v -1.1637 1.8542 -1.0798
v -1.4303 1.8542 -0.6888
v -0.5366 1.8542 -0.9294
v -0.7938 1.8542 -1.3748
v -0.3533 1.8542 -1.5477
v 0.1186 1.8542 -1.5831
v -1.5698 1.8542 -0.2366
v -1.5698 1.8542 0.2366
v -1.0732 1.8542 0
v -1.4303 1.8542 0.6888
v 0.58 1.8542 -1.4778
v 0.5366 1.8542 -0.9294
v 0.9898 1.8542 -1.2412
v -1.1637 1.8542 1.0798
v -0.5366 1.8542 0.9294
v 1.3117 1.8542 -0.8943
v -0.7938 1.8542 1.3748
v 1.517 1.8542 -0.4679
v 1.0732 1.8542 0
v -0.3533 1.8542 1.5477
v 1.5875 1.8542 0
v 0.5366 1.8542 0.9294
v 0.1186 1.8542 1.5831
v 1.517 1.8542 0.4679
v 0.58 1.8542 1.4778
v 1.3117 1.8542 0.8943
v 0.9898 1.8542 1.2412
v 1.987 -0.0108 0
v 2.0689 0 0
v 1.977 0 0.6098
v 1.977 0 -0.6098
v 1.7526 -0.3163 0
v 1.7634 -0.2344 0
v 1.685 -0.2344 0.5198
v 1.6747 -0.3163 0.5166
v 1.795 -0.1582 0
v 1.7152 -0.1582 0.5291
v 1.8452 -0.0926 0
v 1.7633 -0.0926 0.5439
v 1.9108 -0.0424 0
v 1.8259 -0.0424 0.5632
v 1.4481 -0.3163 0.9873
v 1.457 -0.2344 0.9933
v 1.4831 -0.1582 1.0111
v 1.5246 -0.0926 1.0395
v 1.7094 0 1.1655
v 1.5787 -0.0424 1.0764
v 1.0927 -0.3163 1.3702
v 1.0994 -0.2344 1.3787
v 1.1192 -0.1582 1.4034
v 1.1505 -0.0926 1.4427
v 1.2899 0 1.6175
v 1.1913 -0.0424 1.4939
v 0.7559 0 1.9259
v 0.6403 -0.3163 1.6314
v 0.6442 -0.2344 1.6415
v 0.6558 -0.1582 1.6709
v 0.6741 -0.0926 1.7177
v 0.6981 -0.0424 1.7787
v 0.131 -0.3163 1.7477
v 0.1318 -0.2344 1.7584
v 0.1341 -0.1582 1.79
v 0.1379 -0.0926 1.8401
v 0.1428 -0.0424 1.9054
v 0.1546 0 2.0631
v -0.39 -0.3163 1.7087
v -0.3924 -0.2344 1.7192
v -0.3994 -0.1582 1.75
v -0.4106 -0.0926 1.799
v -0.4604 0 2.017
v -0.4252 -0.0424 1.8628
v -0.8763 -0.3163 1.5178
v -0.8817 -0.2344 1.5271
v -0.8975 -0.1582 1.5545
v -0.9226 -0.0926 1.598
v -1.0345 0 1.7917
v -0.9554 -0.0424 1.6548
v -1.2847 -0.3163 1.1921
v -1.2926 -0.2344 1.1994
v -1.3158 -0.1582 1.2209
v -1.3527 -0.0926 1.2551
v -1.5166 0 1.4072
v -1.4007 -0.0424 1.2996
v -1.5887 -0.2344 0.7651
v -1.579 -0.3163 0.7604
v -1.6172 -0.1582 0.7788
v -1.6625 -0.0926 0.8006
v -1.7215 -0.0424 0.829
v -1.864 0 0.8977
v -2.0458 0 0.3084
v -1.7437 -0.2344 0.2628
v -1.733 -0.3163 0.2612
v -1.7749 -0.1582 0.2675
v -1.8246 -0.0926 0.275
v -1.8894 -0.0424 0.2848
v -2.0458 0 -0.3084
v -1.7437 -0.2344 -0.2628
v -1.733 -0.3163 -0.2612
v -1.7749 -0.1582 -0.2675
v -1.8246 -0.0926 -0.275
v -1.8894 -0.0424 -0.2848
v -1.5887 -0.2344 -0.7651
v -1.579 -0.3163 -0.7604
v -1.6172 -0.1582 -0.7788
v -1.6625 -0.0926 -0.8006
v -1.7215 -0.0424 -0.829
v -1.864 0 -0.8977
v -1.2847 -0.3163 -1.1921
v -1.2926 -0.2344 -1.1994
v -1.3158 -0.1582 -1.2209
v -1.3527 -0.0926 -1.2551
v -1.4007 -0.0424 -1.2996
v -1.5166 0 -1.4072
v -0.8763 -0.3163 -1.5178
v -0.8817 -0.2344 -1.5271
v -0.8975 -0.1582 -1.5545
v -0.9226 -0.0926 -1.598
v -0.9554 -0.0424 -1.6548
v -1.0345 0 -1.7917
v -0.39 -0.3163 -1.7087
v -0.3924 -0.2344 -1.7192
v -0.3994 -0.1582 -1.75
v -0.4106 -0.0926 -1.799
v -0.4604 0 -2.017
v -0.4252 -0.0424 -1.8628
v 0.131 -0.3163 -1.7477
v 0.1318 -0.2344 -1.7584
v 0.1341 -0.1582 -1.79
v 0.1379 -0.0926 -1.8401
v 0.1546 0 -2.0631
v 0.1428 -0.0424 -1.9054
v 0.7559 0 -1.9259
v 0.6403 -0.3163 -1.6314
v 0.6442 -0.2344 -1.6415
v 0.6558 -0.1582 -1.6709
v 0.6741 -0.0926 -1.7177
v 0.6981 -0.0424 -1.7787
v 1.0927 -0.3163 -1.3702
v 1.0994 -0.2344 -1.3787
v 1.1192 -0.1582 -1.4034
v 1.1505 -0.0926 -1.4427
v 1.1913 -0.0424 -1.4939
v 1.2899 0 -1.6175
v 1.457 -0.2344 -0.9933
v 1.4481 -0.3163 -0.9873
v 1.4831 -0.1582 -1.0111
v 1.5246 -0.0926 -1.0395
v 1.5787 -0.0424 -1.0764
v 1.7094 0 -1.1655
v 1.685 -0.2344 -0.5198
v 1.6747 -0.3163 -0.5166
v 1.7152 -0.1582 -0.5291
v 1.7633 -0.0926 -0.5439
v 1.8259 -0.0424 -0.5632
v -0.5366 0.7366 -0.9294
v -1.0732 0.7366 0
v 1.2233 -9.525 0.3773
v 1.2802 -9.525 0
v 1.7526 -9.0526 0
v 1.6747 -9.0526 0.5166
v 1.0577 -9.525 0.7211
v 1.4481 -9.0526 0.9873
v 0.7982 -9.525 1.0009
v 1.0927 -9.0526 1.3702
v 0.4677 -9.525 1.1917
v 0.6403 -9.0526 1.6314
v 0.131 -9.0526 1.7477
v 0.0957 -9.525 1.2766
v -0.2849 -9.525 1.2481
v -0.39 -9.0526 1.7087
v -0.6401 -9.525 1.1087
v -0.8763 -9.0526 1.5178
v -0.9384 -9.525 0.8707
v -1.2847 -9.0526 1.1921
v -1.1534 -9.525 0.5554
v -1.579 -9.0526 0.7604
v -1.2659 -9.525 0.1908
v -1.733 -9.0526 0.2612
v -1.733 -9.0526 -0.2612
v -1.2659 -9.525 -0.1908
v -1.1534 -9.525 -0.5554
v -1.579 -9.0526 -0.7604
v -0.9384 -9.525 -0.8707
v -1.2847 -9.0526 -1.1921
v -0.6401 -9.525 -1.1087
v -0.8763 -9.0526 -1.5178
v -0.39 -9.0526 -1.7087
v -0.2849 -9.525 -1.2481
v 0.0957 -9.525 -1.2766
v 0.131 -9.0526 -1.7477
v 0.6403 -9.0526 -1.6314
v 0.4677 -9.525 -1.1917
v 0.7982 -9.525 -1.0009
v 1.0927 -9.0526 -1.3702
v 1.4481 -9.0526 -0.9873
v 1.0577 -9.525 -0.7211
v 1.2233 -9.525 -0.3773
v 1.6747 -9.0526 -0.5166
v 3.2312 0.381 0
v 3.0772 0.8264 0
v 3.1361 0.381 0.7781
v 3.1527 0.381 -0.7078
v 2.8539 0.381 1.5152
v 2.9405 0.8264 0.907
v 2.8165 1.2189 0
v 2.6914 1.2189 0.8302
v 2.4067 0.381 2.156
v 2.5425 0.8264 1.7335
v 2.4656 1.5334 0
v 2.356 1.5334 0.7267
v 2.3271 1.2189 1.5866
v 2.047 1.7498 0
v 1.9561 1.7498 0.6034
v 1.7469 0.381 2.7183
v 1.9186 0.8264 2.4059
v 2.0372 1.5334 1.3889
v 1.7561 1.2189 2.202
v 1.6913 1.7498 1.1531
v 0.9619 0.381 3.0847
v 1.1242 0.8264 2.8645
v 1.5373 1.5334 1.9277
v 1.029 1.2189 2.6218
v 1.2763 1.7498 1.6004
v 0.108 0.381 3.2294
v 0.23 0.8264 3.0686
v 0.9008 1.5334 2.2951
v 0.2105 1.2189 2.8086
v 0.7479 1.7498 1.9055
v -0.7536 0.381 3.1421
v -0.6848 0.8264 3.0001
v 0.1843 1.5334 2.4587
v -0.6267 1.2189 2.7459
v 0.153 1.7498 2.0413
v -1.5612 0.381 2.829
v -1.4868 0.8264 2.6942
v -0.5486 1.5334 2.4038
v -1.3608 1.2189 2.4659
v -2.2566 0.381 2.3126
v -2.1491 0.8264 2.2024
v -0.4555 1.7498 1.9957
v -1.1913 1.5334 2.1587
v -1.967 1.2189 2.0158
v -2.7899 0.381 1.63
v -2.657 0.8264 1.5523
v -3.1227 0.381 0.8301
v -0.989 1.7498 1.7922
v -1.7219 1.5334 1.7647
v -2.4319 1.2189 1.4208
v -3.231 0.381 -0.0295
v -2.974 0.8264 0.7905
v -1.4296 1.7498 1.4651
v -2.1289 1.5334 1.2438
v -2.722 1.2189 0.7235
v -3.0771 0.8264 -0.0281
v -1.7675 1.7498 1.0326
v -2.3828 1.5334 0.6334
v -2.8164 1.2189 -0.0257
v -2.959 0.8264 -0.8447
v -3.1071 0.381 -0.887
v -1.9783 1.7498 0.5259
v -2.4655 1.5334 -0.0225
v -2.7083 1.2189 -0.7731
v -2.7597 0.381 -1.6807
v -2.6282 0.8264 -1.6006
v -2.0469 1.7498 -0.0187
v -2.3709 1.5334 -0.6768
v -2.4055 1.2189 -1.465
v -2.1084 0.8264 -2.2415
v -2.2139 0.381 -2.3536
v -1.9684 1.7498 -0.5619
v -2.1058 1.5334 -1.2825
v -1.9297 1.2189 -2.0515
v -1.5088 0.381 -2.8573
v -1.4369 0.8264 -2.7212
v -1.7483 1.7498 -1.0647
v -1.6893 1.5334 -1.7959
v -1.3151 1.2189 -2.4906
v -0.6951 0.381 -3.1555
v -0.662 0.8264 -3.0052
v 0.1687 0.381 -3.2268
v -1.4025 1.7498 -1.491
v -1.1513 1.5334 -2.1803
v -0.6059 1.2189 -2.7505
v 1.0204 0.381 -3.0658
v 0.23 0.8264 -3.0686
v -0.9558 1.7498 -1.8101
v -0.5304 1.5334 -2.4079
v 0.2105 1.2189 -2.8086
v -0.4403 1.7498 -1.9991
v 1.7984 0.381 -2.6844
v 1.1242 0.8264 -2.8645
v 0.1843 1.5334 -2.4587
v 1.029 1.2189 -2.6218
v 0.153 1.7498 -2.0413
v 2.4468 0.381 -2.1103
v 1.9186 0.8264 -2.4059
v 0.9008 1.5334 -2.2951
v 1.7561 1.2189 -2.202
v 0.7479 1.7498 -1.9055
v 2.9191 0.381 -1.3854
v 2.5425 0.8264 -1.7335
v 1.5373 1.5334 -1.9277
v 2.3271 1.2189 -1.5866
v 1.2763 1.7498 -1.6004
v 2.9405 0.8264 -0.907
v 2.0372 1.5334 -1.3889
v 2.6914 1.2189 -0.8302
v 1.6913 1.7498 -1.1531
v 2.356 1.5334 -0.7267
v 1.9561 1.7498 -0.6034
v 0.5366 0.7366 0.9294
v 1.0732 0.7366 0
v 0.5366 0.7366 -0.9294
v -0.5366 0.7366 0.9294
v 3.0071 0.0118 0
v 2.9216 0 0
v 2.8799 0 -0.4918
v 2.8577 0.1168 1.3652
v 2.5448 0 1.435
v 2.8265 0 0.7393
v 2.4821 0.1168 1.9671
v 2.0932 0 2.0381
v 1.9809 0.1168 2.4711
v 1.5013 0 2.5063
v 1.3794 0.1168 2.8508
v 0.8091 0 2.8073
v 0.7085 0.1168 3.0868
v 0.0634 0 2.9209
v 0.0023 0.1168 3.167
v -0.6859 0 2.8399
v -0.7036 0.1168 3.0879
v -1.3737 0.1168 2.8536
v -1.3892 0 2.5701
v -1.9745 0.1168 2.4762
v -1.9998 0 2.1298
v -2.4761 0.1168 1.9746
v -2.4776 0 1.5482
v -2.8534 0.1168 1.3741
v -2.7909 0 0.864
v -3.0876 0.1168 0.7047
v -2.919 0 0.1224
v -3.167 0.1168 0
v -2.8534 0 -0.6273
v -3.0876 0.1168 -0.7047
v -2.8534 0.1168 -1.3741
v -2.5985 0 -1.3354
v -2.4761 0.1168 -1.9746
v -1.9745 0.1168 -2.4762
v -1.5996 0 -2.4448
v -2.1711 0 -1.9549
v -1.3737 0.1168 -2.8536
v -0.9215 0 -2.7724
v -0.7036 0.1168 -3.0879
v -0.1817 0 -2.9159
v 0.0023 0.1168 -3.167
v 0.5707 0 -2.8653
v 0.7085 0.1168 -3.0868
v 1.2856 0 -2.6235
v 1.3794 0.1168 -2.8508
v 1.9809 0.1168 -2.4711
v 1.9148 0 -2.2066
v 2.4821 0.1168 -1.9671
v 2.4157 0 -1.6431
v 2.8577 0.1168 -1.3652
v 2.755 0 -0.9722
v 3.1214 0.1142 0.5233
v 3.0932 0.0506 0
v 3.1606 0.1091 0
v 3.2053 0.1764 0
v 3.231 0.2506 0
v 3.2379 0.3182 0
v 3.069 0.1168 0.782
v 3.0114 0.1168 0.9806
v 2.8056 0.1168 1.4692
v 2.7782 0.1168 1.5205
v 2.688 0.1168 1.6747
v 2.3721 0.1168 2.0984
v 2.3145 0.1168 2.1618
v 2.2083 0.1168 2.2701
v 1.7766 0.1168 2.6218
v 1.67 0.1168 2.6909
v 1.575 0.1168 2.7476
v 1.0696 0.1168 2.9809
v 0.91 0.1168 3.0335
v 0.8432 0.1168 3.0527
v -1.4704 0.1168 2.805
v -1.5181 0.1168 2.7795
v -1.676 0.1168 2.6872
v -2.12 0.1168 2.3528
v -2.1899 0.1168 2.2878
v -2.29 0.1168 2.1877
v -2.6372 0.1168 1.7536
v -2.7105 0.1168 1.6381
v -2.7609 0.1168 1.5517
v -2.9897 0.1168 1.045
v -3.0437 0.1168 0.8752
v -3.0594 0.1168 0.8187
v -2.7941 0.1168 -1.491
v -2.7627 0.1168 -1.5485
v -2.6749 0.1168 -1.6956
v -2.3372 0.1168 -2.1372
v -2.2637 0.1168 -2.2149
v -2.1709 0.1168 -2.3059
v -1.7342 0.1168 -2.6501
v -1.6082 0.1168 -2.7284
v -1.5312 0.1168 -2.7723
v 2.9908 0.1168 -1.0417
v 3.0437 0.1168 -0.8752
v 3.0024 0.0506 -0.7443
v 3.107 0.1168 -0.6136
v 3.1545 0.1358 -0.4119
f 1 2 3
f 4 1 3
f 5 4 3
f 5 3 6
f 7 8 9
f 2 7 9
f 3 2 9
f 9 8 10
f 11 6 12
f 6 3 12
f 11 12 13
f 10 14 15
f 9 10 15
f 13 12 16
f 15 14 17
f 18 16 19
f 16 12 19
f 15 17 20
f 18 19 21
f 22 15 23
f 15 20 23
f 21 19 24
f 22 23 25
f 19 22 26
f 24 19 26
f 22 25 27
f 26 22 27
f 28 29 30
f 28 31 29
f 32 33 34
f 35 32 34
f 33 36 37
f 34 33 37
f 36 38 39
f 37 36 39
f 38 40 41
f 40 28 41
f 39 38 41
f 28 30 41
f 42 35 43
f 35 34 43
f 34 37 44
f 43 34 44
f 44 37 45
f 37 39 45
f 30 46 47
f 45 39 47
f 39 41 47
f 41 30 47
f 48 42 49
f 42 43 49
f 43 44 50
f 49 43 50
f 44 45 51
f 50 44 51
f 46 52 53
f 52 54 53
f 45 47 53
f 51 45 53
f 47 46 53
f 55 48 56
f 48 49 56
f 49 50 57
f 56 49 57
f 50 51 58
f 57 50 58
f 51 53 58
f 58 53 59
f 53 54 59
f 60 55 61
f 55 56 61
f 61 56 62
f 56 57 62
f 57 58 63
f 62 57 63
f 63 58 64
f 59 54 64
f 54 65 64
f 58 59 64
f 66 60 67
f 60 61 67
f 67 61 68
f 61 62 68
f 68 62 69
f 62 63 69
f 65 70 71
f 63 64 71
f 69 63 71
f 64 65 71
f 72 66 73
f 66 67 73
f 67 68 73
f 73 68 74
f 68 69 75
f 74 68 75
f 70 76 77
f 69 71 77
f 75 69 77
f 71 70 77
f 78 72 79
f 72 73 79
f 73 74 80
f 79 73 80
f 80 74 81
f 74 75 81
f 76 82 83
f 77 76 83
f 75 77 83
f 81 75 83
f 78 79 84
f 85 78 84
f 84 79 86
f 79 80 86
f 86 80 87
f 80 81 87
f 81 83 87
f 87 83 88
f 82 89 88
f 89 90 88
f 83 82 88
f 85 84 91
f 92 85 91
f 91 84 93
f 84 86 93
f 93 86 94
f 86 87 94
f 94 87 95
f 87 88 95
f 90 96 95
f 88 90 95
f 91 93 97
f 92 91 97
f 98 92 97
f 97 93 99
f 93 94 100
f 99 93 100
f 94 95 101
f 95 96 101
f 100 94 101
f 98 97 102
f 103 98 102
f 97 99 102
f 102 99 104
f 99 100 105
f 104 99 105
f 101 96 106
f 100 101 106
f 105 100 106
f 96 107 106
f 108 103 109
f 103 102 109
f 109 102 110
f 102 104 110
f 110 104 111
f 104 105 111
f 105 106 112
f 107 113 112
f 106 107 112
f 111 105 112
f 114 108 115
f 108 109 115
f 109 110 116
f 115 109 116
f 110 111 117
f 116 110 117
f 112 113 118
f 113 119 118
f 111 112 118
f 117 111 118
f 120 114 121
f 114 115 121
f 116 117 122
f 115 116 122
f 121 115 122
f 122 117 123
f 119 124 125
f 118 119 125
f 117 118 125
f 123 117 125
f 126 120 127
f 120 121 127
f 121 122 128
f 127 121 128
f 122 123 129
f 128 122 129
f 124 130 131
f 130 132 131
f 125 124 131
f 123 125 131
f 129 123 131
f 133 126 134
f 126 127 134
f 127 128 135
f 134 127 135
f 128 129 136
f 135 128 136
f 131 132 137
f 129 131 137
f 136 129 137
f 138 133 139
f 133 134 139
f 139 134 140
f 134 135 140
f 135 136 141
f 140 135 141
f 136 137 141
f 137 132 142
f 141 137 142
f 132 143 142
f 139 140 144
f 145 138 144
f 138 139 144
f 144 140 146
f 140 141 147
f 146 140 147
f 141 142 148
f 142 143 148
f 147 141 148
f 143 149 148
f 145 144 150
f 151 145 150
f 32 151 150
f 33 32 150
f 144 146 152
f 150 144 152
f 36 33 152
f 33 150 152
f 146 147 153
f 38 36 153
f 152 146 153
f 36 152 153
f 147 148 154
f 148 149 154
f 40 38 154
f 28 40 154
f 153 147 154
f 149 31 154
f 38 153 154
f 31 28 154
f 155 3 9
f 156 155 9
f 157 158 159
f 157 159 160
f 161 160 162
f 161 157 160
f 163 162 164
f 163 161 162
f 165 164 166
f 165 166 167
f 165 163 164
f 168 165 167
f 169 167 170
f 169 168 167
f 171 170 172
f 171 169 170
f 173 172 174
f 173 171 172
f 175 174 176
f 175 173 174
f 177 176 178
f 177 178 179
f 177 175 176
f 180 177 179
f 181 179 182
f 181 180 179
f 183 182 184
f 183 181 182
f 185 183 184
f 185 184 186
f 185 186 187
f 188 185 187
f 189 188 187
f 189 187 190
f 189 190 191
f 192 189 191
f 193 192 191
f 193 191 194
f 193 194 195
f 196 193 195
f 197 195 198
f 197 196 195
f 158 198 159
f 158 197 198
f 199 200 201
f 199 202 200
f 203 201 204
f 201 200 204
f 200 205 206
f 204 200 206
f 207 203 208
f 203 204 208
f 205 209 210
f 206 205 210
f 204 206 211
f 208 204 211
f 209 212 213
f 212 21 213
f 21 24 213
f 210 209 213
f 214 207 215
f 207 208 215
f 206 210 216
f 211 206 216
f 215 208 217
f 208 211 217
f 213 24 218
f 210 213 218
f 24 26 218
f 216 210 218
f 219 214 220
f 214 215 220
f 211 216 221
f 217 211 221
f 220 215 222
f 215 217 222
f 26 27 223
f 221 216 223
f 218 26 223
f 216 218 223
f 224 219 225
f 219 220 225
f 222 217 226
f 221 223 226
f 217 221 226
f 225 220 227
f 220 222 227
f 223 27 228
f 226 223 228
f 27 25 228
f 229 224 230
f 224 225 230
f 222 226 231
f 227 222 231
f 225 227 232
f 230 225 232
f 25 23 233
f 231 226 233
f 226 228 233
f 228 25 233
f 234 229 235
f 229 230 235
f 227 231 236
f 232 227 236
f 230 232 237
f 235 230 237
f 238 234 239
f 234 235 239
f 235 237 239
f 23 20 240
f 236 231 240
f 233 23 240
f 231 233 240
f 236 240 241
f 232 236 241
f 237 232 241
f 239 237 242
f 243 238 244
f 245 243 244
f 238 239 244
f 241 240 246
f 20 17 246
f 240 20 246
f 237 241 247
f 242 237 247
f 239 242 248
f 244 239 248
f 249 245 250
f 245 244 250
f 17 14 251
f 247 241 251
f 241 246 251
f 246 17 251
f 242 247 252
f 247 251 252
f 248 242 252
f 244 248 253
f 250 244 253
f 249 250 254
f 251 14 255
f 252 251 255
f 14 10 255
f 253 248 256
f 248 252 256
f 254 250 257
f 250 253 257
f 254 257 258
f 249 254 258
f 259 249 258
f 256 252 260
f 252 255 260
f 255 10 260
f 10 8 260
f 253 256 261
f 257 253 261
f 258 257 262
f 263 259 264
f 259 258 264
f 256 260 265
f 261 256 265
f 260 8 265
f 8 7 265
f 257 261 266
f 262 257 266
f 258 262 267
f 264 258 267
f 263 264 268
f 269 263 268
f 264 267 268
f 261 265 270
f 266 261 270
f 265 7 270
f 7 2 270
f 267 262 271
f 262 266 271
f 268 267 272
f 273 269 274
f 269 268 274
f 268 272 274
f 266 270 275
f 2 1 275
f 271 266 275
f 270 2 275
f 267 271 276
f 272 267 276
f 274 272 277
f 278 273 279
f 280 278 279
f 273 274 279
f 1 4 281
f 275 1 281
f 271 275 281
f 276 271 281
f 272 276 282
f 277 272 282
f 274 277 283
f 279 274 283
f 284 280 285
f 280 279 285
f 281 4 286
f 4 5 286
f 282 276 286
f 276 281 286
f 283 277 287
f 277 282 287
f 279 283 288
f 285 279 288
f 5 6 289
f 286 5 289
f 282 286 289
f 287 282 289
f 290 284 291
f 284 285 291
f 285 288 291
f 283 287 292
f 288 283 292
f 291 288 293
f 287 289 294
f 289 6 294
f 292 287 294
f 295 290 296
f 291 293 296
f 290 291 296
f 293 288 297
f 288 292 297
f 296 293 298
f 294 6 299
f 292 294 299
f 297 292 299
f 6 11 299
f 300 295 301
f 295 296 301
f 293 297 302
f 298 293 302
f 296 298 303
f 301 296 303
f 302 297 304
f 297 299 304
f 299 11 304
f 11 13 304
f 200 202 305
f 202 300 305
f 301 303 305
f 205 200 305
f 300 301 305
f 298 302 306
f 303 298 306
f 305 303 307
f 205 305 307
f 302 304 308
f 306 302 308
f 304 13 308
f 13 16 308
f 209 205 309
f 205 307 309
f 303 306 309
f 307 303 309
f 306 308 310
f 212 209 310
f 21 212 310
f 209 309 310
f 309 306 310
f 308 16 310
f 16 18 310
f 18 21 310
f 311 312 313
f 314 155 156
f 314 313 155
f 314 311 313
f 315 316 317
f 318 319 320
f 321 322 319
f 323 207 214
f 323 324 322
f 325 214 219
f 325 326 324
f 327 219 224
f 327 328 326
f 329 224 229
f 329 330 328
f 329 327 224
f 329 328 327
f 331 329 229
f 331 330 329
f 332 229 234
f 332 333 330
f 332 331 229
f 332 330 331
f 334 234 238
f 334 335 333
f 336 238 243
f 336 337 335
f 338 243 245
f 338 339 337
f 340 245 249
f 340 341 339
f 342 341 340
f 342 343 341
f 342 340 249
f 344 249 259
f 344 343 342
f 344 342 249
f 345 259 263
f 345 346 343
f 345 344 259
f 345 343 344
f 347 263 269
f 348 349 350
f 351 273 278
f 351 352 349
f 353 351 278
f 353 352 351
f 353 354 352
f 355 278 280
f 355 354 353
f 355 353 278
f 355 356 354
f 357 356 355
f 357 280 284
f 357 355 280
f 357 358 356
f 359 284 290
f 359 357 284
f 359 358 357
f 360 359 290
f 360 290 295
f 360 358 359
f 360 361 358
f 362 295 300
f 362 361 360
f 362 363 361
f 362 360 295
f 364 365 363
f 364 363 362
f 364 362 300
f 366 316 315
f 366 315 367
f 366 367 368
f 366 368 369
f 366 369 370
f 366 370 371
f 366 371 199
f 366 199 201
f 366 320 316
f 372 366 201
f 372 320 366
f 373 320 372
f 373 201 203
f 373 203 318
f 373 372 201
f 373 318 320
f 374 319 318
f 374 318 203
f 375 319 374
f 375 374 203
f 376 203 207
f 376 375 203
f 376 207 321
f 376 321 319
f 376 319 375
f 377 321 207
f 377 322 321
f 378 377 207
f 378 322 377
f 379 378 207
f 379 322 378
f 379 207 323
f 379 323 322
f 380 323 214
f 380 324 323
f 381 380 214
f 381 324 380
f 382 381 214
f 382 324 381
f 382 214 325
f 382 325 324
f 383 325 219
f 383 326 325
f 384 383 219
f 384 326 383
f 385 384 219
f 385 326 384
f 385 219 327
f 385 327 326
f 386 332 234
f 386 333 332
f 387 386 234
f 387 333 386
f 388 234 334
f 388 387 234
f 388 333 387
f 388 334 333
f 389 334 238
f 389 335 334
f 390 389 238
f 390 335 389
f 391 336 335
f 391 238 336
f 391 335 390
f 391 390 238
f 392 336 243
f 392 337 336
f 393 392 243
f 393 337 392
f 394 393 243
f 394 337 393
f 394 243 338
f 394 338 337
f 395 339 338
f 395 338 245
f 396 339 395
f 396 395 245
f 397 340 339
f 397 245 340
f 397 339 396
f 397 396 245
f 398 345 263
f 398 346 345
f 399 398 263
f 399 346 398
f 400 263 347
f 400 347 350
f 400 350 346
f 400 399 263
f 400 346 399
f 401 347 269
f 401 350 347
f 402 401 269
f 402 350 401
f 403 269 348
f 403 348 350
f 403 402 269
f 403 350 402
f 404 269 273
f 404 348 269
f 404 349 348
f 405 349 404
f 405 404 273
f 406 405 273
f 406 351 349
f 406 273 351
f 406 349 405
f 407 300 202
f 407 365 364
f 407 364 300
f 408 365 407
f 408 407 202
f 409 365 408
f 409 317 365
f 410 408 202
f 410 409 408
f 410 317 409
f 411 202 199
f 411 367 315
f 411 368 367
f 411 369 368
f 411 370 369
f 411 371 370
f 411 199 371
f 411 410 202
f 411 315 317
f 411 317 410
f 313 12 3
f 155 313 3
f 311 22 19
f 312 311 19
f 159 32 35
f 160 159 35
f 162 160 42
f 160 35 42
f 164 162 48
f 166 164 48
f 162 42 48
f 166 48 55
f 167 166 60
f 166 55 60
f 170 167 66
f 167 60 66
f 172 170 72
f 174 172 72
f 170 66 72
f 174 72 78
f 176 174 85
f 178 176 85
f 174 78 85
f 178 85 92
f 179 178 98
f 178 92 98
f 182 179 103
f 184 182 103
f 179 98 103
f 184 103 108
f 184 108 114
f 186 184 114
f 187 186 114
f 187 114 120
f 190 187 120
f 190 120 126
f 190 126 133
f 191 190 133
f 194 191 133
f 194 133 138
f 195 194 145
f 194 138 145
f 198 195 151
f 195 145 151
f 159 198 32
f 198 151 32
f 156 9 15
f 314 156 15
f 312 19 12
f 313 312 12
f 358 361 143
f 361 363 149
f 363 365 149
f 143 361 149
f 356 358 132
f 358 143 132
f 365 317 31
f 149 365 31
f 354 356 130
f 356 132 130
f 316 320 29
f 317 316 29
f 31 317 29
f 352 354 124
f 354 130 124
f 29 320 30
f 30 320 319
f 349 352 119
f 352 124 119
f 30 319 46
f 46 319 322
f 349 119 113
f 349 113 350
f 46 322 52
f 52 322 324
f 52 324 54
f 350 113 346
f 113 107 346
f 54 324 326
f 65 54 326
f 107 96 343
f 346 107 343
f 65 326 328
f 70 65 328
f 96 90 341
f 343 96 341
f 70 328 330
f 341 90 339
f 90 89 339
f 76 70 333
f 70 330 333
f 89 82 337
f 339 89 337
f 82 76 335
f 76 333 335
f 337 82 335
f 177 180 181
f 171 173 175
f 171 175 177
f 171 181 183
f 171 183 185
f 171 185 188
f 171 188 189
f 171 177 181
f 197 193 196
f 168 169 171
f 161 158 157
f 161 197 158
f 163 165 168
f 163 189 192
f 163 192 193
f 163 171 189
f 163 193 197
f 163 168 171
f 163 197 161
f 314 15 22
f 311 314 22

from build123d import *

# Parameters (mm, degrees)
SKETCH2_R           = 1.7526
BOSS_EXTRUDE1_DEPTH = 9.525
CUT_EXTRUDE1_DEPTH  = 1.1176
CHAMFER1_SIZE       = 0.47244
FILLET1_R           = 0.316308646


with BuildPart() as part:
    # Sketch1 → Revolve1 (revolve)
    with BuildSketch(Plane.XY):
        with BuildLine():
            Line((1.5875, 1.8542), (0, 1.8542))
            Line((0, 1.8542), (0, 0))
            Line((0, 0), (3.270560013, 0))
            ThreePointArc((3.270560013, 0), (2.787047666, 1.252073146), (1.5875, 1.8542))
        make_face()
    revolve(axis=Axis((0, 1.8542, 0), (0, -1, 0)))

    # Sketch2 → Boss-Extrude1 (add)
    with BuildSketch(Plane.XZ):
        Circle(SKETCH2_R)
    extrude(amount=BOSS_EXTRUDE1_DEPTH)

    # Sketch3 → Cut-Extrude1 (cut)
    with BuildSketch(Plane(origin=(0, 1.8542, 0), x_dir=(-1, 0, 0), z_dir=(0, 1, 0))):
        Polygon((0.536575, -0.929375162), (1.07315, 0), (0.536575, 0.929375162), (-0.536575, 0.929375162), (-1.07315, 0), (-0.536575, -0.929375162), align=None)
    extrude(amount=-CUT_EXTRUDE1_DEPTH, mode=Mode.SUBTRACT)

    # Chamfer1
    chamfer1_edges = [part.edges().sort_by_distance(p)[0] for p in [
        (-1.7526, -9.525, 0),
    ]]
    chamfer(chamfer1_edges, length=CHAMFER1_SIZE)

    # Fillet1
    fillet1_edges = [part.edges().sort_by_distance(p)[0] for p in [
        (-3.270560013, 0, 0),
        (-1.7526, 0, 0),
    ]]
    fillet(fillet1_edges, radius=FILLET1_R)


solid = part.part
